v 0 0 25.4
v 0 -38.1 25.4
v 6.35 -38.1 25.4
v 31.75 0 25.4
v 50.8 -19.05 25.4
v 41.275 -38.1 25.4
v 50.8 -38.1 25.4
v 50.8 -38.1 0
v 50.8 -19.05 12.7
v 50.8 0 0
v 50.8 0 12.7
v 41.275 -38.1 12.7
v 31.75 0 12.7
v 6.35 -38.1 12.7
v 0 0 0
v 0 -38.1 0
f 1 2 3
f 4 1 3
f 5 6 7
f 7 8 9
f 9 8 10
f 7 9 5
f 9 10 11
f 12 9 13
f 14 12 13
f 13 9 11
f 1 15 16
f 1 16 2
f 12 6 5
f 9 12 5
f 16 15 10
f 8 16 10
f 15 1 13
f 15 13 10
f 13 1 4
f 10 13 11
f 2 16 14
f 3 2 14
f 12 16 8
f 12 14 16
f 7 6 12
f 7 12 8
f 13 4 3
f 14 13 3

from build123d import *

# Parameters (mm, degrees)
F0_W     = 50.8
F0_H     = 25.4
F1_DEPTH = 38.1
F2_W     = 19.05
F2_H     = 12.7
F3_DEPTH = 19.05
F5_DEPTH = 12.7


with BuildPart() as f1:
    # F0 (on Front) → F1 (new body)
    with BuildSketch(Plane.XZ):
        with Locations((25.4, 12.7)):
            Rectangle(F0_W, F0_H)
    extrude(amount=F1_DEPTH)

    # F2 (on face) → F3 (cut)
    with BuildSketch(Plane.YZ.offset(50.8)):
        with Locations((-9.525, 19.05)):
            Rectangle(F2_W, F2_H)
    extrude(amount=-F3_DEPTH, mode=Mode.SUBTRACT)

    # F4 (on face) → F5 (cut)
    with BuildSketch(Plane.XY.offset(25.4)):
        Polygon((41.275, -38.1), (50.8, -19.05), (31.75, -19.05), (31.75, 0), (6.35, -38.1), align=None)
    extrude(amount=-F5_DEPTH, mode=Mode.SUBTRACT)


solid = f1.part
